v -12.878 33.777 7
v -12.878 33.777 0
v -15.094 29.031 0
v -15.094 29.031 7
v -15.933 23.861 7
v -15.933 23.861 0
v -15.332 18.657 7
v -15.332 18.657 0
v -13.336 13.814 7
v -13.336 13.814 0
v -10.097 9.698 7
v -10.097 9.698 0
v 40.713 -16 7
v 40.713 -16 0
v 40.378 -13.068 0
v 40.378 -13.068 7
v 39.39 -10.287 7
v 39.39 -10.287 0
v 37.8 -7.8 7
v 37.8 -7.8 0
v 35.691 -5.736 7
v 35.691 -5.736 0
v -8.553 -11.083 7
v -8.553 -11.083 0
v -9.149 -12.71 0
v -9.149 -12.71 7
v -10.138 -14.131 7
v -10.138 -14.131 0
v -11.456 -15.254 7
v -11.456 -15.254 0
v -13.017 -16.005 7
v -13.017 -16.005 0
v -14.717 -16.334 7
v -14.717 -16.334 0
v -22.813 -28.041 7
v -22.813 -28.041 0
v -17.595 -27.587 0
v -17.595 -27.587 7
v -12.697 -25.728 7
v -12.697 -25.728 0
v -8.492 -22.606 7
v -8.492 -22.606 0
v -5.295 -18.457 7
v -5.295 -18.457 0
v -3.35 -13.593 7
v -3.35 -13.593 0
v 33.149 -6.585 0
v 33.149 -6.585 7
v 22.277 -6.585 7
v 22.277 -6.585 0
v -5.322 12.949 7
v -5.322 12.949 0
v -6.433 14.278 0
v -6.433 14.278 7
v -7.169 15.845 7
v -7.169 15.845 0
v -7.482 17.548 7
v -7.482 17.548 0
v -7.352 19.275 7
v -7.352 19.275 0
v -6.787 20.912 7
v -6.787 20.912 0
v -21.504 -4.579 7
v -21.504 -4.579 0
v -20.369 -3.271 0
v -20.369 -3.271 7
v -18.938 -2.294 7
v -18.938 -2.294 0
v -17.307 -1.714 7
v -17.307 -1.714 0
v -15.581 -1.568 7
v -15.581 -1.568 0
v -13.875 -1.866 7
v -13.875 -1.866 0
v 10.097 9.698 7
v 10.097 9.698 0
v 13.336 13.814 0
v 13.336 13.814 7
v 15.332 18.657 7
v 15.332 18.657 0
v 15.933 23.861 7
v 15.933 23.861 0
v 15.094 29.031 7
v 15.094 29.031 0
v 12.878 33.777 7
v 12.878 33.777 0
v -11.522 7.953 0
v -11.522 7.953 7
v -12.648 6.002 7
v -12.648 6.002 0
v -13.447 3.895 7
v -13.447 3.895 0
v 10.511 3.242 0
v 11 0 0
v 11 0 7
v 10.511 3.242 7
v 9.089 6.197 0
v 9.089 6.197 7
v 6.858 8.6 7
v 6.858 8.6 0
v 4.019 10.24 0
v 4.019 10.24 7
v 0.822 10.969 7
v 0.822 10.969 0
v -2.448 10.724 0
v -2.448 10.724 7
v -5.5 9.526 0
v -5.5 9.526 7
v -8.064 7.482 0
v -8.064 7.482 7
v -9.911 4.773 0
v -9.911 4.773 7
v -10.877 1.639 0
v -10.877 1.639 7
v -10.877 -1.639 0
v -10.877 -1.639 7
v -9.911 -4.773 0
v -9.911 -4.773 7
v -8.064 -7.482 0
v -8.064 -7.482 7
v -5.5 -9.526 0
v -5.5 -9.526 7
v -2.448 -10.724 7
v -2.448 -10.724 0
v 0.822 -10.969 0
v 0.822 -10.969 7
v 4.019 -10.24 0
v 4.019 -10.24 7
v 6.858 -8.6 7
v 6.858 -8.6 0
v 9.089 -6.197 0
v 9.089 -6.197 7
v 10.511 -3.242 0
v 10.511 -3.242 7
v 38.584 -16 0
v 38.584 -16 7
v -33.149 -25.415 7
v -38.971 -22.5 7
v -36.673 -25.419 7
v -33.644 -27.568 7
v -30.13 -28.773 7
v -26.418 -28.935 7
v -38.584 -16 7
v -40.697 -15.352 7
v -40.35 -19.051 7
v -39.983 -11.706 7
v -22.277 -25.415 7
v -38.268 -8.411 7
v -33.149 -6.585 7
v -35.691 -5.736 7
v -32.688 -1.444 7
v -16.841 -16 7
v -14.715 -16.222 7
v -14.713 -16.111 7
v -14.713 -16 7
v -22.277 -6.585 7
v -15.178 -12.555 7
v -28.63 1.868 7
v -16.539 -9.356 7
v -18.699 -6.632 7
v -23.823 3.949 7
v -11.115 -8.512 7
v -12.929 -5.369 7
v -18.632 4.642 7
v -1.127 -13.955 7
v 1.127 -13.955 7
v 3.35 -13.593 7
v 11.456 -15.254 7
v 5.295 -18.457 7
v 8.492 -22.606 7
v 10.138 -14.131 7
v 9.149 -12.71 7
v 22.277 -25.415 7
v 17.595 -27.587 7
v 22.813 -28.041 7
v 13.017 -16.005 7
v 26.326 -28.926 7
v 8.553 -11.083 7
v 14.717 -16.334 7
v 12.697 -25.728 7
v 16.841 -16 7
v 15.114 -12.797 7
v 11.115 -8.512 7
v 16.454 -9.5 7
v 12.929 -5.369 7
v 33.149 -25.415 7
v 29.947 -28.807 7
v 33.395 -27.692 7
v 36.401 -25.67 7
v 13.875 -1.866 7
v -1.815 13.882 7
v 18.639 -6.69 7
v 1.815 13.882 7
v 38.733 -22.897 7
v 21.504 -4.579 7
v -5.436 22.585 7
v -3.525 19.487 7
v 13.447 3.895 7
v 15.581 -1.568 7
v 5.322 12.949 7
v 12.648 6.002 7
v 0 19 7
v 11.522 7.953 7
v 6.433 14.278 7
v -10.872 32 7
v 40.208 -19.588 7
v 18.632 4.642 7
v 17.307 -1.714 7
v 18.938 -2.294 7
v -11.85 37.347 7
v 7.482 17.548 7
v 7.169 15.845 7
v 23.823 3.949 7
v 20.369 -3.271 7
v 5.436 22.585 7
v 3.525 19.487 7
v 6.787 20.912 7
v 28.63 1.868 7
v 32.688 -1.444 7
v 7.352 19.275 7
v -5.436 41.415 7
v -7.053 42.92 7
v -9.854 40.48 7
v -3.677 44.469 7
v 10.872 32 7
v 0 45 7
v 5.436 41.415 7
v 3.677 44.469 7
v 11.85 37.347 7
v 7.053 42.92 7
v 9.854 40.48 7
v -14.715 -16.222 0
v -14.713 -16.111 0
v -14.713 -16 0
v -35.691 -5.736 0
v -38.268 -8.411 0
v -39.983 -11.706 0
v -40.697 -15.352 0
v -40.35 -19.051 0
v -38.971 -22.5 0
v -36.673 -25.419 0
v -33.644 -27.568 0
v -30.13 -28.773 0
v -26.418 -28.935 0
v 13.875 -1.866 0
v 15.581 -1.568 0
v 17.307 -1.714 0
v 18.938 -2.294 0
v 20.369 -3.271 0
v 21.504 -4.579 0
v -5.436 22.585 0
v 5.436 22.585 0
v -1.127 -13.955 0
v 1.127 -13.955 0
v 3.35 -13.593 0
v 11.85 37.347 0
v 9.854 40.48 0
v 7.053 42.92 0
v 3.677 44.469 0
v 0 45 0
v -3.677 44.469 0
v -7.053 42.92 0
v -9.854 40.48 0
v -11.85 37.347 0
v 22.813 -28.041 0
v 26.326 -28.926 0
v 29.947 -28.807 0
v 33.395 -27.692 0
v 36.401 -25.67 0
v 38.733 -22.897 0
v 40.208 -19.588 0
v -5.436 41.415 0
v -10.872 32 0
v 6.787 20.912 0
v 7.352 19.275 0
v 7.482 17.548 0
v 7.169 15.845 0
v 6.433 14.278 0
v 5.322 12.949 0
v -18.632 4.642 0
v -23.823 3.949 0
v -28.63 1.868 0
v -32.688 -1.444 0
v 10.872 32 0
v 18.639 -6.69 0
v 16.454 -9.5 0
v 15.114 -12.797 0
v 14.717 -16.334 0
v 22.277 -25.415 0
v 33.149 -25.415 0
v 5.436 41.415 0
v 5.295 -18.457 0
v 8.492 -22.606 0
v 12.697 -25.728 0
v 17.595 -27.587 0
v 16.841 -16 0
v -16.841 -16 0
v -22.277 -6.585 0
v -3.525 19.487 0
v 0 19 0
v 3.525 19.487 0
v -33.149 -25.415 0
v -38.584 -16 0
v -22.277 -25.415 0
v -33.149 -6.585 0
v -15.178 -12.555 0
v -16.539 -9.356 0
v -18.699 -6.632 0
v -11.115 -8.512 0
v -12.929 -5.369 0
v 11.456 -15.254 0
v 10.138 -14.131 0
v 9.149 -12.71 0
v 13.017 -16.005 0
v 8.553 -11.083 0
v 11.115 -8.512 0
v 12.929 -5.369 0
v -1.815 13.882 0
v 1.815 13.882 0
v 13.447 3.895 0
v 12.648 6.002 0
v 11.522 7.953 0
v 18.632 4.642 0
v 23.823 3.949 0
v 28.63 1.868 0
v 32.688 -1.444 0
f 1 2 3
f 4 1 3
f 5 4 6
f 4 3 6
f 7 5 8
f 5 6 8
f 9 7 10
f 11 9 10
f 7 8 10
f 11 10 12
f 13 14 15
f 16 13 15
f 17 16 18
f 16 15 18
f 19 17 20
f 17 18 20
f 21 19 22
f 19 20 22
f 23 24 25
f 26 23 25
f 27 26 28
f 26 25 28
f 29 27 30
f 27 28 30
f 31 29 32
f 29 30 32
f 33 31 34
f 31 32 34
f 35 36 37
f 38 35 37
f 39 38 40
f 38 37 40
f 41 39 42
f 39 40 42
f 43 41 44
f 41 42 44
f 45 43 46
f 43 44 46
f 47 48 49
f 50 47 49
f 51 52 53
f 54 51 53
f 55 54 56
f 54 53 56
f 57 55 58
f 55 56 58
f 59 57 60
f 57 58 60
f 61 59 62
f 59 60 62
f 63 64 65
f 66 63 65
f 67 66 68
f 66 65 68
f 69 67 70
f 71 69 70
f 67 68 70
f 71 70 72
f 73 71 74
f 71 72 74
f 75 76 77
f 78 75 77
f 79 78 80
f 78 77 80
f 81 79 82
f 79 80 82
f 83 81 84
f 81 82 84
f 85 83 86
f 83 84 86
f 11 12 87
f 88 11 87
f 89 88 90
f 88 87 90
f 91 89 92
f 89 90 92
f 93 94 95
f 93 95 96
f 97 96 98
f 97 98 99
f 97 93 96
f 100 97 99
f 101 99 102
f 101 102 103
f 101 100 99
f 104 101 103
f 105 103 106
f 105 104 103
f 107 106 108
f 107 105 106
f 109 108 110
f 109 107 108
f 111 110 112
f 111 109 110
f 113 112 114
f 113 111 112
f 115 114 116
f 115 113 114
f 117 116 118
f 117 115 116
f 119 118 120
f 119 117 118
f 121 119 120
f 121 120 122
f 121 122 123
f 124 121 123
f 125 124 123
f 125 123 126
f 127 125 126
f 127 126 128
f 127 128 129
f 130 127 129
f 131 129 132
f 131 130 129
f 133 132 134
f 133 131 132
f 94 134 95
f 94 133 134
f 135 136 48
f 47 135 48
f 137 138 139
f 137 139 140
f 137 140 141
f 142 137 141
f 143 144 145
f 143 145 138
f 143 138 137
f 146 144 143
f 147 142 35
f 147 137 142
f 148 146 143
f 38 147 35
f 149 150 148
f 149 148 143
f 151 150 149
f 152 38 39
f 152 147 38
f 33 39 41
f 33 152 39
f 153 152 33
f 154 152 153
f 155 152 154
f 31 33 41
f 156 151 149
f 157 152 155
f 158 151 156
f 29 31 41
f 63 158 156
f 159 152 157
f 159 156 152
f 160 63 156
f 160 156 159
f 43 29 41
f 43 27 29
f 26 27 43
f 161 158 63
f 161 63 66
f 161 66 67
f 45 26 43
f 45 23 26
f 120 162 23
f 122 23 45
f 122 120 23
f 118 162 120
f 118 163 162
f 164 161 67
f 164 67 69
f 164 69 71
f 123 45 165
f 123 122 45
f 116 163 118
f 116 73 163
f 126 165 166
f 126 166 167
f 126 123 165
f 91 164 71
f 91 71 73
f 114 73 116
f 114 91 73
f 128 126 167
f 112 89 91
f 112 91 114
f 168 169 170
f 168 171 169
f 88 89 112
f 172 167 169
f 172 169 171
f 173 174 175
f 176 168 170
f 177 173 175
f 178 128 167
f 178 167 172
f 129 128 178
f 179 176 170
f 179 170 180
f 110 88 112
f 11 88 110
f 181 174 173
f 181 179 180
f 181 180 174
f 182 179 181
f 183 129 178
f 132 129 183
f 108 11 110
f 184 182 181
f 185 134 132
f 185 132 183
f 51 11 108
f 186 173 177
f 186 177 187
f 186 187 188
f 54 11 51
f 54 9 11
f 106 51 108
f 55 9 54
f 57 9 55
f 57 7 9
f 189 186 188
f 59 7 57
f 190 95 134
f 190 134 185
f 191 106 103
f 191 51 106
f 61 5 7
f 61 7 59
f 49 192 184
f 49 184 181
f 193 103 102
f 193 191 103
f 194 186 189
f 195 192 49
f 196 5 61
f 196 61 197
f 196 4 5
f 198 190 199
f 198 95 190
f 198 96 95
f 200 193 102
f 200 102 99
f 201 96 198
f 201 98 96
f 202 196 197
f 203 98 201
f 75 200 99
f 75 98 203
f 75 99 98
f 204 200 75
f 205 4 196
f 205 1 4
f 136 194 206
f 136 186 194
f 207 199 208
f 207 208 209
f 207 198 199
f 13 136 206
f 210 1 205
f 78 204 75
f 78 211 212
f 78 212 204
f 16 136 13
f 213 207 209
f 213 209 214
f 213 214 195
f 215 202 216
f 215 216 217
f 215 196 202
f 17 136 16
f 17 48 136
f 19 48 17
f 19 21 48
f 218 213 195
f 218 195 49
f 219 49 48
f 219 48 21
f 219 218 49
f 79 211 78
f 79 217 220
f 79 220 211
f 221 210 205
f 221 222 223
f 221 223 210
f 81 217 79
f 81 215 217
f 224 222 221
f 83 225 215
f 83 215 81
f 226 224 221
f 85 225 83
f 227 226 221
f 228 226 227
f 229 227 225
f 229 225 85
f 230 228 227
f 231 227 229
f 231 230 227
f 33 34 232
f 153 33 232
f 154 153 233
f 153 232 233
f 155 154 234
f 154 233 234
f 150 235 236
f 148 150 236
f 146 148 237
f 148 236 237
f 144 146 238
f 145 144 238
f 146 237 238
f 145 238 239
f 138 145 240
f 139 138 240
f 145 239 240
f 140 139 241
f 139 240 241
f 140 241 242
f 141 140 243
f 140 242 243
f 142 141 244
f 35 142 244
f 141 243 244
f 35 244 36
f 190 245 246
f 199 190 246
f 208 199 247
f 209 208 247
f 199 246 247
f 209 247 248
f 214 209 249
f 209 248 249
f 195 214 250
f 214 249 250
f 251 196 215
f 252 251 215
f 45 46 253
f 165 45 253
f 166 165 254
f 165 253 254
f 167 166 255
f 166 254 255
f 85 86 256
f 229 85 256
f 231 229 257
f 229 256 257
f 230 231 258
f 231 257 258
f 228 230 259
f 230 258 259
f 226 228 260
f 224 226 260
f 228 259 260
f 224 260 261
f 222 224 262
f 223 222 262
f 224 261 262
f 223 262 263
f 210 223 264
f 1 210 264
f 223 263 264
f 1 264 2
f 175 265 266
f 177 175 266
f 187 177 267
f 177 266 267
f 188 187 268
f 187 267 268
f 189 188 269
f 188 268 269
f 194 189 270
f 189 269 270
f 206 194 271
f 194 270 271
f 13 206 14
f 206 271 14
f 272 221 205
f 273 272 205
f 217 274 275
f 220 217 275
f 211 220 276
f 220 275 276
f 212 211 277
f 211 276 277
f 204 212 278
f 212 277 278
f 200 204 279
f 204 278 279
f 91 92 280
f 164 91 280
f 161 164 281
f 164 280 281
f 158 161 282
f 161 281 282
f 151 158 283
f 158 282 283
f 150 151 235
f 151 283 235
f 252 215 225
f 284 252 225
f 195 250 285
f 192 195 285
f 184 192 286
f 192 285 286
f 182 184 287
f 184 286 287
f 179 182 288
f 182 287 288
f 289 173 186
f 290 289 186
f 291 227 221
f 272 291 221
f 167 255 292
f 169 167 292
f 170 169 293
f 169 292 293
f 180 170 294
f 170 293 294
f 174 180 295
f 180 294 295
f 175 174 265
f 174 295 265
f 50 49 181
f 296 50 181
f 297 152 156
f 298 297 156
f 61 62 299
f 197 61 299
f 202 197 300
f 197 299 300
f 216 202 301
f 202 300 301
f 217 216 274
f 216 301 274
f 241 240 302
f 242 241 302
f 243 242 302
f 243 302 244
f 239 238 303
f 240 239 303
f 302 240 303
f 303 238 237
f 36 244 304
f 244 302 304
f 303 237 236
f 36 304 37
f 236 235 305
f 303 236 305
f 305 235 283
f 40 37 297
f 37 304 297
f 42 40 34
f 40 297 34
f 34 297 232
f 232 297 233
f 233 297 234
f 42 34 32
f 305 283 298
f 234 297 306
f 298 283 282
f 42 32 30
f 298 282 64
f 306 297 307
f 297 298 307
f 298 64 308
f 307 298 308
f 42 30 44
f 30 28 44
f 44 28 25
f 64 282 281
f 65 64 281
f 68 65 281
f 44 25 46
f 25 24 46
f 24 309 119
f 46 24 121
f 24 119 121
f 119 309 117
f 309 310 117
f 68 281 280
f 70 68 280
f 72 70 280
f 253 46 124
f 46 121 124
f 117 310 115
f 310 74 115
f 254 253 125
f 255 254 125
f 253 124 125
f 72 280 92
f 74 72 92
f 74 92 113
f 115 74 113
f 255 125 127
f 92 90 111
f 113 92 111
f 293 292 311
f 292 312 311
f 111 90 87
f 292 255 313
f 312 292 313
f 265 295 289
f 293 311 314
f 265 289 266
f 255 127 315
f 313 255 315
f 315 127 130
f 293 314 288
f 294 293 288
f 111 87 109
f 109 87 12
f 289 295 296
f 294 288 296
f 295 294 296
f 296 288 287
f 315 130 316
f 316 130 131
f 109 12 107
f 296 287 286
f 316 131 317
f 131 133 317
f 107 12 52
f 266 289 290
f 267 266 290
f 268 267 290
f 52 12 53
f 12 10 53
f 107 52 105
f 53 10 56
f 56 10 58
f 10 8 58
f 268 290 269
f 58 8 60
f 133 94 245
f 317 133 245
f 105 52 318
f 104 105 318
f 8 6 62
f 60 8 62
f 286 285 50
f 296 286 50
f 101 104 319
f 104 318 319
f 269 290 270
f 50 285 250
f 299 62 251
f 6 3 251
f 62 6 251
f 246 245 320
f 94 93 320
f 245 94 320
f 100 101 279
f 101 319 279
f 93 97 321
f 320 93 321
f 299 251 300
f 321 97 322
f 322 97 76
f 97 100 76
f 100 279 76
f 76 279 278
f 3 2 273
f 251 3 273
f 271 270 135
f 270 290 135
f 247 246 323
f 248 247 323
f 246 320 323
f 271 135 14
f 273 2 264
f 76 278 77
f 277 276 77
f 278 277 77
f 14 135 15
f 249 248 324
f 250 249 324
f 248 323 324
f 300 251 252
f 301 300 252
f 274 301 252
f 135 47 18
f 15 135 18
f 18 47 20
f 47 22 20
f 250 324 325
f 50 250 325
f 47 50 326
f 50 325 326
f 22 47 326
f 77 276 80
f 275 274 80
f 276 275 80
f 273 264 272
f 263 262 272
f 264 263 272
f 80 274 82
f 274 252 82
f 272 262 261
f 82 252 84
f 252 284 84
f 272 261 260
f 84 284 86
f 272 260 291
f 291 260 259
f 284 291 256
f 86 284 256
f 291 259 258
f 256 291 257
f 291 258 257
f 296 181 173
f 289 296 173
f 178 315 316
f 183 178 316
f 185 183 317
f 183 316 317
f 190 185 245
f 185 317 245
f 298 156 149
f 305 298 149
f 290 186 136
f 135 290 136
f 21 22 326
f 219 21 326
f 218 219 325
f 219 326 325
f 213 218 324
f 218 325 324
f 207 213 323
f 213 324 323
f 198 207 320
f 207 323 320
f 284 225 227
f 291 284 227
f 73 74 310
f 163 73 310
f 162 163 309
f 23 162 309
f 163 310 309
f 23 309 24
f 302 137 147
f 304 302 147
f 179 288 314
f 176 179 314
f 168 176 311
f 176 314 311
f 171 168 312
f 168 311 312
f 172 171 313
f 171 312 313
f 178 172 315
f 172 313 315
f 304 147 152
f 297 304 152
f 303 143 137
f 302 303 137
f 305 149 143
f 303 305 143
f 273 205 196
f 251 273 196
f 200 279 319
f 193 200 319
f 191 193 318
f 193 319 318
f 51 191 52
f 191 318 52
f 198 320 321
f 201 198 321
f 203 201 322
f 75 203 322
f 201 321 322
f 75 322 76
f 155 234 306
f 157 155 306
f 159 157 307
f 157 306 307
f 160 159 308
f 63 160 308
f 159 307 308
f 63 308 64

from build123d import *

# Parameters (mm, degrees)
F0_R     = 11
F1_DEPTH = 7
F3_DEPTH = 31


with BuildPart() as f1:
    # F0 (on Top) → F1 (new body)
    with BuildSketch(Plane.XY):
        with BuildLine():
            ThreePointArc((-35.690819, -5.735916), (-38.971143, -22.5), (-22.812859, -28.041198))
            ThreePointArc((-22.812859, -28.041198), (-17.02025, -23.393855), (-14.717093, -16.333573))
            ThreePointArc((-14.717093, -16.333573), (-14.713883, -16.1668), (-14.712813, -16))
            ThreePointArc((-14.712813, -16), (-16.538809, -9.356082), (-21.503836, -4.57859))
            ThreePointArc((-21.503836, -4.57859), (-28.769798, -3.043041), (-35.690819, -5.735916))
        make_face()
        with BuildLine():
            ThreePointArc((-13.875123, -1.865735), (-13.961542, 1.036992), (-13.447237, 3.8951))
            ThreePointArc((-13.447237, 3.8951), (-26.298738, 3.074491), (-35.690819, -5.735916))
            ThreePointArc((-35.690819, -5.735916), (-28.769798, -3.043041), (-21.503836, -4.57859))
            ThreePointArc((-21.503836, -4.57859), (-18.141279, -1.951674), (-13.875123, -1.865735))
        make_face()
        with BuildLine():
            ThreePointArc((-22.812859, -28.041198), (-10.486782, -24.312621), (-3.350363, -13.593199))
            ThreePointArc((-3.350363, -13.593199), (-6.08271, -12.609546), (-8.553336, -11.083341))
            ThreePointArc((-8.553336, -11.083341), (-10.760839, -14.734971), (-14.717093, -16.333573))
            ThreePointArc((-14.717093, -16.333573), (-17.02025, -23.393855), (-22.812859, -28.041198))
        make_face()
        with BuildLine():
            ThreePointArc((13.875123, -1.865735), (13.968746, -0.934955), (14, 0))
            ThreePointArc((14, 0), (13.861121, 1.967063), (13.447237, 3.8951))
            ThreePointArc((13.447237, 3.8951), (12.124356, 7), (10.096874, 9.698099))
            ThreePointArc((10.096874, 9.698099), (7.878832, 11.572554), (5.321787, 12.949076))
            ThreePointArc((5.321787, 12.949076), (0, 14), (-5.321787, 12.949076))
            ThreePointArc((-5.321787, 12.949076), (-7.878832, 11.572554), (-10.096874, 9.698099))
            ThreePointArc((-10.096874, 9.698099), (-12.124356, 7), (-13.447237, 3.8951))
            ThreePointArc((-13.447237, 3.8951), (-13.961542, 1.036992), (-13.875123, -1.865735))
            ThreePointArc((-13.875123, -1.865735), (-12.124356, -7), (-8.553336, -11.083341))
            ThreePointArc((-8.553336, -11.083341), (-6.08271, -12.609546), (-3.350363, -13.593199))
            ThreePointArc((-3.350363, -13.593199), (0, -14), (3.350363, -13.593199))
            ThreePointArc((3.350363, -13.593199), (6.08271, -12.609546), (8.553336, -11.083341))
            ThreePointArc((8.553336, -11.083341), (12.124356, -7), (13.875123, -1.865735))
        make_face()
        Circle(F0_R, mode=Mode.SUBTRACT)
        with BuildLine():
            ThreePointArc((-10.096874, 9.698099), (-7.878832, 11.572554), (-5.321787, 12.949076))
            ThreePointArc((-5.321787, 12.949076), (-7.38044, 16.686646), (-6.786742, 20.912163))
            ThreePointArc((-6.786742, 20.912163), (-11.749548, 26.436896), (-12.87796, 33.777114))
            ThreePointArc((-12.87796, 33.777114), (-15.811956, 21.23813), (-10.096874, 9.698099))
        make_face()
        with BuildLine():
            ThreePointArc((13, 32), (12.969454, 32.89065), (12.87796, 33.777114))
            ThreePointArc((12.87796, 33.777114), (0, 45), (-12.87796, 33.777114))
            ThreePointArc((-12.87796, 33.777114), (-11.749548, 26.436896), (-6.786742, 20.912163))
            ThreePointArc((-6.786742, 20.912163), (0, 19), (6.786742, 20.912163))
            ThreePointArc((6.786742, 20.912163), (11.340804, 25.644988), (13, 32))
        make_face()
        with BuildLine():
            ThreePointArc((5.321787, 12.949076), (7.878832, 11.572554), (10.096874, 9.698099))
            ThreePointArc((10.096874, 9.698099), (15.811956, 21.23813), (12.87796, 33.777114))
            ThreePointArc((12.87796, 33.777114), (12.969454, 32.89065), (13, 32))
            ThreePointArc((13, 32), (11.340804, 25.644988), (6.786742, 20.912163))
            ThreePointArc((6.786742, 20.912163), (7.38044, 16.686646), (5.321787, 12.949076))
        make_face()
        with BuildLine():
            ThreePointArc((13.447237, 3.8951), (13.861121, 1.967063), (14, 0))
            ThreePointArc((14, 0), (13.968746, -0.934955), (13.875123, -1.865735))
            ThreePointArc((13.875123, -1.865735), (18.141279, -1.951674), (21.503836, -4.57859))
            ThreePointArc((21.503836, -4.57859), (28.769798, -3.043041), (35.690819, -5.735916))
            ThreePointArc((35.690819, -5.735916), (26.298738, 3.074491), (13.447237, 3.8951))
        make_face()
        with BuildLine():
            ThreePointArc((14.717093, -16.333573), (10.760839, -14.734971), (8.553336, -11.083341))
            ThreePointArc((8.553336, -11.083341), (6.08271, -12.609546), (3.350363, -13.593199))
            ThreePointArc((3.350363, -13.593199), (10.486782, -24.312621), (22.812859, -28.041198))
            ThreePointArc((22.812859, -28.041198), (17.02025, -23.393855), (14.717093, -16.333573))
        make_face()
        with BuildLine():
            ThreePointArc((40.712813, -16), (39.390015, -10.286598), (35.690819, -5.735916))
            ThreePointArc((35.690819, -5.735916), (28.769798, -3.043041), (21.503836, -4.57859))
            ThreePointArc((21.503836, -4.57859), (16.454483, -9.5), (14.717093, -16.333573))
            ThreePointArc((14.717093, -16.333573), (17.02025, -23.393855), (22.812859, -28.041198))
            ThreePointArc((22.812859, -28.041198), (34.968866, -26.786552), (40.712813, -16))
        make_face()
    extrude(amount=F1_DEPTH)

    # F2 (on face) → F3 (cut)
    with BuildSketch(Plane.XY.offset(7)):
        Polygon((-38.584318, -16), (-33.148566, -25.415), (-22.27706, -25.415), (-16.841307, -16), (-22.27706, -6.585), (-33.148566, -6.585), align=None)
        Polygon((33.148566, -25.415), (38.584318, -16), (33.148566, -6.585), (22.27706, -6.585), (16.841307, -16), (22.27706, -25.415), align=None)
        Polygon((5.435753, 41.415), (-5.435753, 41.415), (-10.871506, 32), (-5.435753, 22.585), (5.435753, 22.585), (10.871506, 32), align=None)
    extrude(amount=-F3_DEPTH, mode=Mode.SUBTRACT)


solid = f1.part
